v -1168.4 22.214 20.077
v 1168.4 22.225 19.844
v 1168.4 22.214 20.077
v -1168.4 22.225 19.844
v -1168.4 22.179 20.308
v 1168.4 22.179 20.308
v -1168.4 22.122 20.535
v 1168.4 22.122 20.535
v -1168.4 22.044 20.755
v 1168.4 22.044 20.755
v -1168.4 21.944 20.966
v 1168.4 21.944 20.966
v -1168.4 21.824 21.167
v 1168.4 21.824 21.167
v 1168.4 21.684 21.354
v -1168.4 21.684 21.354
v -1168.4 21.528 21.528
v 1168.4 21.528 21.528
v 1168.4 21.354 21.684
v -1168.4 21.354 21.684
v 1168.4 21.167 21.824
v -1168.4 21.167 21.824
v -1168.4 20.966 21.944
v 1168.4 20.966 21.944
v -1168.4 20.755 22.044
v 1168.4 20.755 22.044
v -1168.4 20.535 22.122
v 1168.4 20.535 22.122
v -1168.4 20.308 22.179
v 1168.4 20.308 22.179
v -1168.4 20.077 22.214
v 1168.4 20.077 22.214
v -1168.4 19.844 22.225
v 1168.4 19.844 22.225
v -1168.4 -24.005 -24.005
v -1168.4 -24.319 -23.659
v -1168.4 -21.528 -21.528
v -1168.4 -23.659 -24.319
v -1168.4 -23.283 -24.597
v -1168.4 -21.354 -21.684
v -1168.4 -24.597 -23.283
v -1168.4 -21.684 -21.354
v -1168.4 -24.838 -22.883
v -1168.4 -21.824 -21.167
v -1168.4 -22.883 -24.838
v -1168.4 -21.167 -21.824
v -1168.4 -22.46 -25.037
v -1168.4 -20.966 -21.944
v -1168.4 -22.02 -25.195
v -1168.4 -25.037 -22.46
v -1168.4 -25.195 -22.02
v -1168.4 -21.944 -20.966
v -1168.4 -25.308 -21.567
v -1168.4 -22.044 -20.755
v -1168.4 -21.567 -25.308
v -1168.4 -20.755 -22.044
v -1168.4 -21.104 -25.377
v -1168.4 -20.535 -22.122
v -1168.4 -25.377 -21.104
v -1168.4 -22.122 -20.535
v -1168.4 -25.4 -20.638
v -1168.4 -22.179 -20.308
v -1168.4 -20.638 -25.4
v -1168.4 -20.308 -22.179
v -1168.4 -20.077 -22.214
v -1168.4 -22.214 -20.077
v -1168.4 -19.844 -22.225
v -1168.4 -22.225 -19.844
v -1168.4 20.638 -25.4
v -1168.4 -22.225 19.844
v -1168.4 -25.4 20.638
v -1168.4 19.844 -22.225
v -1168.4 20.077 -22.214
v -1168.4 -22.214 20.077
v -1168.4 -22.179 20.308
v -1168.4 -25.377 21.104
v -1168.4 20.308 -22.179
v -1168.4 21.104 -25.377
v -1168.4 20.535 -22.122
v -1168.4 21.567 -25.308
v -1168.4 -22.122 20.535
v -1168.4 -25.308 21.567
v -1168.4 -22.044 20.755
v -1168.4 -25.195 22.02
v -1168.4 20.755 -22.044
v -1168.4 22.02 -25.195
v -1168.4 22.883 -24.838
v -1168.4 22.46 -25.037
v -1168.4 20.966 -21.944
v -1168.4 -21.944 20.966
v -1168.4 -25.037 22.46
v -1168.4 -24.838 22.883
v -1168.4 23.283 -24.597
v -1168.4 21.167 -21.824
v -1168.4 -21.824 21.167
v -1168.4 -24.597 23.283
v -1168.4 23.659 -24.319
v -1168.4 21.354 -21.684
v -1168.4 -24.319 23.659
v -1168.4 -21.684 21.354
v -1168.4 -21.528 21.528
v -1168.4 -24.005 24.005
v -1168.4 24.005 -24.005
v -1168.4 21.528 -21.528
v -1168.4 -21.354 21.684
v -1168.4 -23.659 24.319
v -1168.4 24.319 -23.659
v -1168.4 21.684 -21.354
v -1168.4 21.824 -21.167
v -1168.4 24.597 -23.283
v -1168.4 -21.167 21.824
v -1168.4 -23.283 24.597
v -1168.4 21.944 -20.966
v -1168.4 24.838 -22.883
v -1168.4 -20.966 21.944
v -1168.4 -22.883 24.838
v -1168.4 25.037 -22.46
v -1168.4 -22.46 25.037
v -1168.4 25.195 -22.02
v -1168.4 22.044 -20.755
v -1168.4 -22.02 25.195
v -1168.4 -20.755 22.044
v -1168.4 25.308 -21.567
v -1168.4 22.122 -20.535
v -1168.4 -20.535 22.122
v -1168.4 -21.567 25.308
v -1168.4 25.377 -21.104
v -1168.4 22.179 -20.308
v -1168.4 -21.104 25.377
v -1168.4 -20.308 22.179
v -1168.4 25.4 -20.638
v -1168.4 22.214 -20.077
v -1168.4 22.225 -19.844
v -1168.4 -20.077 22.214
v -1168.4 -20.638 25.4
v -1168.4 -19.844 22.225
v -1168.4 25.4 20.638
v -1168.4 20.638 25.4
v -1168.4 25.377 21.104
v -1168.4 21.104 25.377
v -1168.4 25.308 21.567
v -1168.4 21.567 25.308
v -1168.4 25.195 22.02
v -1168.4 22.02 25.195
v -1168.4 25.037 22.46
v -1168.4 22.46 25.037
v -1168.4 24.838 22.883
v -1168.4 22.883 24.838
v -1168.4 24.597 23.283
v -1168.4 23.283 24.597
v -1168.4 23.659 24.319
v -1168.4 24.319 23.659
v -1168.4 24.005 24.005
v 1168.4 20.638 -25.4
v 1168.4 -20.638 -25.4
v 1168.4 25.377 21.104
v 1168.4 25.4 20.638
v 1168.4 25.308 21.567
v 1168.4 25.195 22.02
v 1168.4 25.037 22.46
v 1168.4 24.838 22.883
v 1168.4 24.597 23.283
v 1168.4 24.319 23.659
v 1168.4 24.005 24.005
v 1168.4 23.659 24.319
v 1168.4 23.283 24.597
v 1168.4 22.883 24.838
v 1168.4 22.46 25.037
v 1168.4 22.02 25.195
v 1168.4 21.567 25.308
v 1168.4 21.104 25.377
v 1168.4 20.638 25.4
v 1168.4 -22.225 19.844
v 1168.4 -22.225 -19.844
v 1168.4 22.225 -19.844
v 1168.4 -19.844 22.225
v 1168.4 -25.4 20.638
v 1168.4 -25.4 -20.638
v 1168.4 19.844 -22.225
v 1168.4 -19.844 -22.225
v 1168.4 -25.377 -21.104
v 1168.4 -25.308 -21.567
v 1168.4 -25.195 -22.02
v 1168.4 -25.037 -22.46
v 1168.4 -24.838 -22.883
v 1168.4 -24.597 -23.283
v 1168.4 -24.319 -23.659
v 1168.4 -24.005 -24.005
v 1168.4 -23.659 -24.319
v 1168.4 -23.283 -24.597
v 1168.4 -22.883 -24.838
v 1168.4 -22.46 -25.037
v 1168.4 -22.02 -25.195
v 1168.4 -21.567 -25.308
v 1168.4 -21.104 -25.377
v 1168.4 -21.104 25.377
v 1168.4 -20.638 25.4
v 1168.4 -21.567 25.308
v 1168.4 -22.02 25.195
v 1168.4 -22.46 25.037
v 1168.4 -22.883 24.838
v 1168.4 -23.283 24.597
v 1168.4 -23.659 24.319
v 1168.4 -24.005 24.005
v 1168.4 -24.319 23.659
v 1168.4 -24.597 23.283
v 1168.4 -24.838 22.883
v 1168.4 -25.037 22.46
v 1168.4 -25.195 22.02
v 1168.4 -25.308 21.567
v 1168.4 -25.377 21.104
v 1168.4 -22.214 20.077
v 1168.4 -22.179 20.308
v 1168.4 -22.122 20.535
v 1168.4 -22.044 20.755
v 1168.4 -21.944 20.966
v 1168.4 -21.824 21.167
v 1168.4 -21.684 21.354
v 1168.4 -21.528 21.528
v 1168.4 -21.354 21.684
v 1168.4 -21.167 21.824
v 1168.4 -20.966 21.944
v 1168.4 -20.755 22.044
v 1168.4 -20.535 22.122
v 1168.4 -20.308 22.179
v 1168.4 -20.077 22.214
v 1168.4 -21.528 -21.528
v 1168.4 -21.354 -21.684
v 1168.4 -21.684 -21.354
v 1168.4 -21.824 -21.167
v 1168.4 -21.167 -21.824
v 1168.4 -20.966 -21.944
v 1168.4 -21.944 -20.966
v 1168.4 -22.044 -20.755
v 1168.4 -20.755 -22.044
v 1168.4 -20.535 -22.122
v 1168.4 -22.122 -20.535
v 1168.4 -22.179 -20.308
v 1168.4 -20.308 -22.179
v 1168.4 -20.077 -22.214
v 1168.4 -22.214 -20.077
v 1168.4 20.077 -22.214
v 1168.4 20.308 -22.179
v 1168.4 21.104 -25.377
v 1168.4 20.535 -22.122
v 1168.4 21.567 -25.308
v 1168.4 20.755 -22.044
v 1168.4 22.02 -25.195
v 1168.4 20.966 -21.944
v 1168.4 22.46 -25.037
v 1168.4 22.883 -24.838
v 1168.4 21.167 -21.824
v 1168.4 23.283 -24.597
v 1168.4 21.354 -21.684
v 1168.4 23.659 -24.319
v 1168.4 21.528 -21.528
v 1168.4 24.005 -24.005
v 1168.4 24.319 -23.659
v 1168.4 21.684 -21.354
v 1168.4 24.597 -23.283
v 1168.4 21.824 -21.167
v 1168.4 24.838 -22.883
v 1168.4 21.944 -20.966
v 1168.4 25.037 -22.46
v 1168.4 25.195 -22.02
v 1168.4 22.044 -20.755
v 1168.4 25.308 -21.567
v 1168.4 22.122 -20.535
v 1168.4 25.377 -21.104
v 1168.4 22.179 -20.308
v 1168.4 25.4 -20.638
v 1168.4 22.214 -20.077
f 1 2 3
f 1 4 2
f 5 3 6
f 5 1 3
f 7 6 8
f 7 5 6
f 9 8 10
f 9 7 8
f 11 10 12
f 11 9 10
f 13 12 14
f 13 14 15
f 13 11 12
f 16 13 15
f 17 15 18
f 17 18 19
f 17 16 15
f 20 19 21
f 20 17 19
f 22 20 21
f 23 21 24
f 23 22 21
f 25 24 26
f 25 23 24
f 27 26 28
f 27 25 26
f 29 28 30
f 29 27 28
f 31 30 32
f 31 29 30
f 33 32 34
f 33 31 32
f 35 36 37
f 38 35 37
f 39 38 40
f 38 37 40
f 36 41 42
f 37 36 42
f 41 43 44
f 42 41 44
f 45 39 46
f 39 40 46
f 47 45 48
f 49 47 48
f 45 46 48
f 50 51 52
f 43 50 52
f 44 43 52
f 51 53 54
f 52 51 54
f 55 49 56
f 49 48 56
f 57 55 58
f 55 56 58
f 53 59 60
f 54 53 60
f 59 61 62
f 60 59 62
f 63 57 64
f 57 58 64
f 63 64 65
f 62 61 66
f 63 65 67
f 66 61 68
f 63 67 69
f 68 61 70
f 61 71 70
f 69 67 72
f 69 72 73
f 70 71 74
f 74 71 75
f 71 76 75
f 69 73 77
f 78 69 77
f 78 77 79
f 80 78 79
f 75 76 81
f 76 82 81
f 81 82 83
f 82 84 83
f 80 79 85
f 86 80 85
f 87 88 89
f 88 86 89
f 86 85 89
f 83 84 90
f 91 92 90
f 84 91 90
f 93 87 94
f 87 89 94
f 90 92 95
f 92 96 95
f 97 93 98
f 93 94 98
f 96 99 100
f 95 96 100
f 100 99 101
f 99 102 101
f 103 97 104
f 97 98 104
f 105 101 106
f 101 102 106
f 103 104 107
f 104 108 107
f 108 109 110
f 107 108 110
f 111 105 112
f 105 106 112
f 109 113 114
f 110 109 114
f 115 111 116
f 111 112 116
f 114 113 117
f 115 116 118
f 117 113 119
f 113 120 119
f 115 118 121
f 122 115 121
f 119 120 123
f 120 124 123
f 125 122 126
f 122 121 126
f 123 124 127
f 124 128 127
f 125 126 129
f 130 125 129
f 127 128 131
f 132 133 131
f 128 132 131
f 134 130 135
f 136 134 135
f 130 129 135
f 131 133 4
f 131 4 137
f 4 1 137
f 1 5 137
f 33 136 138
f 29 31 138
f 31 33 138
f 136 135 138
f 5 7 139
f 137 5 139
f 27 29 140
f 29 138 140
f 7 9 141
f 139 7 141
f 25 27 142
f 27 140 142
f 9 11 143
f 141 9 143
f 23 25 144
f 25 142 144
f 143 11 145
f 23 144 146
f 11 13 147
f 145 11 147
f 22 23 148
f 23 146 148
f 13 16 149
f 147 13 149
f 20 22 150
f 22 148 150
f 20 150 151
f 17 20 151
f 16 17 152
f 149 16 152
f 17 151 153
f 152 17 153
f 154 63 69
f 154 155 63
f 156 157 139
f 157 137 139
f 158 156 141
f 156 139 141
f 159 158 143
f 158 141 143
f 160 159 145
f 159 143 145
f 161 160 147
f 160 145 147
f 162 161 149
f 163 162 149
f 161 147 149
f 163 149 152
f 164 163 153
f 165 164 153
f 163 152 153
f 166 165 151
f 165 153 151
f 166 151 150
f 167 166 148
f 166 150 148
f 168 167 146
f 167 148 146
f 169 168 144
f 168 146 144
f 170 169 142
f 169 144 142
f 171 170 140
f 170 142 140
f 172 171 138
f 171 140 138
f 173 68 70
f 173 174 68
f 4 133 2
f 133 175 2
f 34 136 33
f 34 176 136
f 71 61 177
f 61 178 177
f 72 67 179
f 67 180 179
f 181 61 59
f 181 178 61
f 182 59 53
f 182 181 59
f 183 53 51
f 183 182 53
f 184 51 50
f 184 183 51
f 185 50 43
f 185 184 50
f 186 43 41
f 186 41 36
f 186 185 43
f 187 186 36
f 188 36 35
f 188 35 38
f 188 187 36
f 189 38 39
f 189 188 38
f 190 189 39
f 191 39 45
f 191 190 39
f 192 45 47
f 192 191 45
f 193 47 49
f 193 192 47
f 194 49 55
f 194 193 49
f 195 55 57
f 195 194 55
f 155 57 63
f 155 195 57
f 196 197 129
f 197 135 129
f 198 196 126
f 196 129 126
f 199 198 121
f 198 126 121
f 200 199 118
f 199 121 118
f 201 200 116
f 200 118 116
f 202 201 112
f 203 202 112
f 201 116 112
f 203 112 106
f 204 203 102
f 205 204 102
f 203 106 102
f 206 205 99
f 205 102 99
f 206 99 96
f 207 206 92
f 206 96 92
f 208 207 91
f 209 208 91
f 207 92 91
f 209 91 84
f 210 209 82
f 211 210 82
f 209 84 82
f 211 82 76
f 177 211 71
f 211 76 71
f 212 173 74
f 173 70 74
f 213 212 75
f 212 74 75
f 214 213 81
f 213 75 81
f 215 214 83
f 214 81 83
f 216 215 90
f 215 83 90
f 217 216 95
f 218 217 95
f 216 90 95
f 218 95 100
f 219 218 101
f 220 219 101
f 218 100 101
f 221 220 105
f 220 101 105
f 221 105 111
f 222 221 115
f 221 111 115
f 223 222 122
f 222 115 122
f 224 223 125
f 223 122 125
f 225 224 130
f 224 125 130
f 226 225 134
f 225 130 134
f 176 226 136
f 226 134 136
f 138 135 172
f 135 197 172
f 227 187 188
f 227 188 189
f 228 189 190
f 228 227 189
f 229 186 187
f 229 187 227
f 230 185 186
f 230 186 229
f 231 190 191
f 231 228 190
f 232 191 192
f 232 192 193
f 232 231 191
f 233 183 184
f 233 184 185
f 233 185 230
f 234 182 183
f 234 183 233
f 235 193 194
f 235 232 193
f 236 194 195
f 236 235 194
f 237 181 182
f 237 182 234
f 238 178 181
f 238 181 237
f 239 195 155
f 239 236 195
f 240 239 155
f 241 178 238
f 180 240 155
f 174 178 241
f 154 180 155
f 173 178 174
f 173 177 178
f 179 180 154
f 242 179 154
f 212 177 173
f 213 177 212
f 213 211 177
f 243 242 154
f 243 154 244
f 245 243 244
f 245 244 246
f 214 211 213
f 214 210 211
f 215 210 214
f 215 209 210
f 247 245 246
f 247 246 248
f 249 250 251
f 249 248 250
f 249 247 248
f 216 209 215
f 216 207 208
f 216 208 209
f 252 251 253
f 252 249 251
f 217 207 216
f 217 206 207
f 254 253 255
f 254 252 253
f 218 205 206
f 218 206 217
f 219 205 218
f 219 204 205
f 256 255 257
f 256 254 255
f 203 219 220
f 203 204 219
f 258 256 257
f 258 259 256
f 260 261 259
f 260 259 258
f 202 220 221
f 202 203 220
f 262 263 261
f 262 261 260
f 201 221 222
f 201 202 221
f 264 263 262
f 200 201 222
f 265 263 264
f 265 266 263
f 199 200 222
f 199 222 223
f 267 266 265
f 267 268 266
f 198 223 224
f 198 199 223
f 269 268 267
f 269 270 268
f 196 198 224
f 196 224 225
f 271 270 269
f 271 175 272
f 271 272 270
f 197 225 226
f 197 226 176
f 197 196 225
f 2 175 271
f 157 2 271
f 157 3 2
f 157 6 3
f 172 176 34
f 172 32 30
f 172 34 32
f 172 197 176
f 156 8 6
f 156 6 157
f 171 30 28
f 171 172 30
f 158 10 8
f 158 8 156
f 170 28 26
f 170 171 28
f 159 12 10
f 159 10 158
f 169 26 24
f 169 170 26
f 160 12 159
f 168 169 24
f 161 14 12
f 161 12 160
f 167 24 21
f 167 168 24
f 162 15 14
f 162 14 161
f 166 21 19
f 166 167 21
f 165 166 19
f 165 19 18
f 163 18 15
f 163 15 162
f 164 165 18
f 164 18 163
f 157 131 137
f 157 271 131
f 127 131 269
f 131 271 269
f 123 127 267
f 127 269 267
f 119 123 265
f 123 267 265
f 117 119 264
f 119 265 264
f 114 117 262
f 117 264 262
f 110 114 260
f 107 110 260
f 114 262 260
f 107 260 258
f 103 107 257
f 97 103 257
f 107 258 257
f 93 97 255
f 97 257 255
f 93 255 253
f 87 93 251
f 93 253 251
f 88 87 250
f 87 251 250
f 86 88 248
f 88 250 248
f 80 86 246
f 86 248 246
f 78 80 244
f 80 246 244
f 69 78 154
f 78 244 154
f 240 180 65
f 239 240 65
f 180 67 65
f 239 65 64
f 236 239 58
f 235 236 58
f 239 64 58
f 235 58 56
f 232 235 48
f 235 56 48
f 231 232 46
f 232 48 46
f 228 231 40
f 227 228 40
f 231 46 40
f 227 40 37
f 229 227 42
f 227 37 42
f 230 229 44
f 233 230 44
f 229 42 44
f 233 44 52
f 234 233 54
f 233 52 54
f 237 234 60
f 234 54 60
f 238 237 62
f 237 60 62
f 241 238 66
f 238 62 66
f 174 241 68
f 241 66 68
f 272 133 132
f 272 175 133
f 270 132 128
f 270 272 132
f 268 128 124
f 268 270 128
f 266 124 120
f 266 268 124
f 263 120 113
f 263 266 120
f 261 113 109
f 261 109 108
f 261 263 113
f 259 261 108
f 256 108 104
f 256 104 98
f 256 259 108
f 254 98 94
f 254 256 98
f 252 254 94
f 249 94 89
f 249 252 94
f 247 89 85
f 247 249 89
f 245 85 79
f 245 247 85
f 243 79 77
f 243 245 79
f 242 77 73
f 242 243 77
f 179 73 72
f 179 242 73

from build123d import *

# Parameters (mm, degrees)
F0_W     = 50.8
F0_H     = 50.8
F1_DEPTH = 1168.4
F2_T     = -3.175
F3_R     = 4.7625
F4_R     = 2.38125


with BuildPart() as f1:
    # F0 (on Right) → F1 (new body, symmetric)
    with BuildSketch(Plane.YZ):
        Rectangle(F0_W, F0_H)
    extrude(amount=F1_DEPTH, both=True)

    # F2
    f2_openings = [f1.faces().sort_by_distance(p)[0] for p in [
        (1168.4, 0, 0),
        (-1168.4, 0, 0),
    ]]
    offset(amount=F2_T, openings=f2_openings)

    # F3
    f3_edges = [f1.edges().sort_by_distance(p)[0] for p in [
        (0, 25.4, 25.4),
        (0, -25.4, 25.4),
        (0, 25.4, -25.4),
        (0, -25.4, -25.4),
    ]]
    fillet(f3_edges, radius=F3_R)

    # F4
    f4_edges = [f1.edges().sort_by_distance(p)[0] for p in [
        (0, -22.225, 22.225),
        (0, -22.225, -22.225),
        (0, 22.225, -22.225),
        (0, 22.225, 22.225),
    ]]
    fillet(f4_edges, radius=F4_R)


solid = f1.part
